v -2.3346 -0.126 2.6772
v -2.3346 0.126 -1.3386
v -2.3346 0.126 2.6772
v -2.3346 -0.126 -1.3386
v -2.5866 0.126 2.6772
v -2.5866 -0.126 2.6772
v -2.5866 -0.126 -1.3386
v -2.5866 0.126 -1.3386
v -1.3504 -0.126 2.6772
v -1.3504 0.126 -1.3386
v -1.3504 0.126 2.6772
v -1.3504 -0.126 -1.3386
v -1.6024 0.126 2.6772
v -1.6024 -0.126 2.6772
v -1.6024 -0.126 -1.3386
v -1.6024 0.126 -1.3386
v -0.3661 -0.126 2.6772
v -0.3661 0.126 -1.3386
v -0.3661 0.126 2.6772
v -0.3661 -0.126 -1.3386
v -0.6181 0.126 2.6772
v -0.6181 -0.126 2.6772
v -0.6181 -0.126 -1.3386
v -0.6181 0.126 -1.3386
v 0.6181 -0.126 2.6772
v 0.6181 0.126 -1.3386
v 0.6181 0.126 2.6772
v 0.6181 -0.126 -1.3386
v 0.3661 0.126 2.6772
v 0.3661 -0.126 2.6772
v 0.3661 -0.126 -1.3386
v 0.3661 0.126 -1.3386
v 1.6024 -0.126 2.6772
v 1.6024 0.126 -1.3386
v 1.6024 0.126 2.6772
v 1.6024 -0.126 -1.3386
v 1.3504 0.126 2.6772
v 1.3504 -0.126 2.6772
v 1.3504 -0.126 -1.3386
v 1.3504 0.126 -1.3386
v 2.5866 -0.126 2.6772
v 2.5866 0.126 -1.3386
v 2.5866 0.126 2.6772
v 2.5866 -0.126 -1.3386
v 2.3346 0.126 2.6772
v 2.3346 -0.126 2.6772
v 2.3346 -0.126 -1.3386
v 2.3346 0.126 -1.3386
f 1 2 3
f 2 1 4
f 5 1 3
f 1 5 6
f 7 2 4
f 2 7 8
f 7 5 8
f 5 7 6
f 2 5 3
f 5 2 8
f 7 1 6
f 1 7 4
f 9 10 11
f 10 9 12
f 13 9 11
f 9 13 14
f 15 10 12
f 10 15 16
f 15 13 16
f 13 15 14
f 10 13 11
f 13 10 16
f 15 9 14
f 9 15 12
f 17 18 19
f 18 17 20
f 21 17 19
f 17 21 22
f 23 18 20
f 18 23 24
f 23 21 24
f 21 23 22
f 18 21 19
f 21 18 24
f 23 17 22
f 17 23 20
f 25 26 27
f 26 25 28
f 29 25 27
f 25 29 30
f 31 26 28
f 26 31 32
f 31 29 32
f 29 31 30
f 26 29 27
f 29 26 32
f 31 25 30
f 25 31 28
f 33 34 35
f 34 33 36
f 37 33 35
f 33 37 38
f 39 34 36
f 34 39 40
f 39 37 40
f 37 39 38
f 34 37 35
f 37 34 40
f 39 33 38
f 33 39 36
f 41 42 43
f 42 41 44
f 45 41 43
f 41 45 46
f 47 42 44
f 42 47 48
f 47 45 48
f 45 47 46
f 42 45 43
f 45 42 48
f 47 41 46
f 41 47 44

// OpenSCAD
// file: defines.scad
// example012.stl is Mblock.stl, (c) 2009 Will Langford
// licensed under the Creative Commons - GNU GPL license.
// http://www.thingiverse.com/thing:753

//import("sim800c.stl", convexity=3);

// PCB

A = 2.5;
B = 17.4;

scale = 1/2.54;
// main file
include <defines.scad>

pitch = 2.5;
p_w = 0.64;
p_h = 7.0;

module Pin(x, y) {
  translate([x - p_w/2, y - p_w/2, -3.4])
    cube(size = [p_w, p_w, p_h + 3.2], center = false);
}

// Pins
scale(scale) color("Silver") {
  Pin(-pitch*5/2, 0);
  Pin(-pitch*3/2, 0);
  Pin(-pitch/2, 0);
  Pin( pitch/2, 0);
  Pin( pitch*3/2, 0);
  Pin( pitch*5/2, 0);
}
